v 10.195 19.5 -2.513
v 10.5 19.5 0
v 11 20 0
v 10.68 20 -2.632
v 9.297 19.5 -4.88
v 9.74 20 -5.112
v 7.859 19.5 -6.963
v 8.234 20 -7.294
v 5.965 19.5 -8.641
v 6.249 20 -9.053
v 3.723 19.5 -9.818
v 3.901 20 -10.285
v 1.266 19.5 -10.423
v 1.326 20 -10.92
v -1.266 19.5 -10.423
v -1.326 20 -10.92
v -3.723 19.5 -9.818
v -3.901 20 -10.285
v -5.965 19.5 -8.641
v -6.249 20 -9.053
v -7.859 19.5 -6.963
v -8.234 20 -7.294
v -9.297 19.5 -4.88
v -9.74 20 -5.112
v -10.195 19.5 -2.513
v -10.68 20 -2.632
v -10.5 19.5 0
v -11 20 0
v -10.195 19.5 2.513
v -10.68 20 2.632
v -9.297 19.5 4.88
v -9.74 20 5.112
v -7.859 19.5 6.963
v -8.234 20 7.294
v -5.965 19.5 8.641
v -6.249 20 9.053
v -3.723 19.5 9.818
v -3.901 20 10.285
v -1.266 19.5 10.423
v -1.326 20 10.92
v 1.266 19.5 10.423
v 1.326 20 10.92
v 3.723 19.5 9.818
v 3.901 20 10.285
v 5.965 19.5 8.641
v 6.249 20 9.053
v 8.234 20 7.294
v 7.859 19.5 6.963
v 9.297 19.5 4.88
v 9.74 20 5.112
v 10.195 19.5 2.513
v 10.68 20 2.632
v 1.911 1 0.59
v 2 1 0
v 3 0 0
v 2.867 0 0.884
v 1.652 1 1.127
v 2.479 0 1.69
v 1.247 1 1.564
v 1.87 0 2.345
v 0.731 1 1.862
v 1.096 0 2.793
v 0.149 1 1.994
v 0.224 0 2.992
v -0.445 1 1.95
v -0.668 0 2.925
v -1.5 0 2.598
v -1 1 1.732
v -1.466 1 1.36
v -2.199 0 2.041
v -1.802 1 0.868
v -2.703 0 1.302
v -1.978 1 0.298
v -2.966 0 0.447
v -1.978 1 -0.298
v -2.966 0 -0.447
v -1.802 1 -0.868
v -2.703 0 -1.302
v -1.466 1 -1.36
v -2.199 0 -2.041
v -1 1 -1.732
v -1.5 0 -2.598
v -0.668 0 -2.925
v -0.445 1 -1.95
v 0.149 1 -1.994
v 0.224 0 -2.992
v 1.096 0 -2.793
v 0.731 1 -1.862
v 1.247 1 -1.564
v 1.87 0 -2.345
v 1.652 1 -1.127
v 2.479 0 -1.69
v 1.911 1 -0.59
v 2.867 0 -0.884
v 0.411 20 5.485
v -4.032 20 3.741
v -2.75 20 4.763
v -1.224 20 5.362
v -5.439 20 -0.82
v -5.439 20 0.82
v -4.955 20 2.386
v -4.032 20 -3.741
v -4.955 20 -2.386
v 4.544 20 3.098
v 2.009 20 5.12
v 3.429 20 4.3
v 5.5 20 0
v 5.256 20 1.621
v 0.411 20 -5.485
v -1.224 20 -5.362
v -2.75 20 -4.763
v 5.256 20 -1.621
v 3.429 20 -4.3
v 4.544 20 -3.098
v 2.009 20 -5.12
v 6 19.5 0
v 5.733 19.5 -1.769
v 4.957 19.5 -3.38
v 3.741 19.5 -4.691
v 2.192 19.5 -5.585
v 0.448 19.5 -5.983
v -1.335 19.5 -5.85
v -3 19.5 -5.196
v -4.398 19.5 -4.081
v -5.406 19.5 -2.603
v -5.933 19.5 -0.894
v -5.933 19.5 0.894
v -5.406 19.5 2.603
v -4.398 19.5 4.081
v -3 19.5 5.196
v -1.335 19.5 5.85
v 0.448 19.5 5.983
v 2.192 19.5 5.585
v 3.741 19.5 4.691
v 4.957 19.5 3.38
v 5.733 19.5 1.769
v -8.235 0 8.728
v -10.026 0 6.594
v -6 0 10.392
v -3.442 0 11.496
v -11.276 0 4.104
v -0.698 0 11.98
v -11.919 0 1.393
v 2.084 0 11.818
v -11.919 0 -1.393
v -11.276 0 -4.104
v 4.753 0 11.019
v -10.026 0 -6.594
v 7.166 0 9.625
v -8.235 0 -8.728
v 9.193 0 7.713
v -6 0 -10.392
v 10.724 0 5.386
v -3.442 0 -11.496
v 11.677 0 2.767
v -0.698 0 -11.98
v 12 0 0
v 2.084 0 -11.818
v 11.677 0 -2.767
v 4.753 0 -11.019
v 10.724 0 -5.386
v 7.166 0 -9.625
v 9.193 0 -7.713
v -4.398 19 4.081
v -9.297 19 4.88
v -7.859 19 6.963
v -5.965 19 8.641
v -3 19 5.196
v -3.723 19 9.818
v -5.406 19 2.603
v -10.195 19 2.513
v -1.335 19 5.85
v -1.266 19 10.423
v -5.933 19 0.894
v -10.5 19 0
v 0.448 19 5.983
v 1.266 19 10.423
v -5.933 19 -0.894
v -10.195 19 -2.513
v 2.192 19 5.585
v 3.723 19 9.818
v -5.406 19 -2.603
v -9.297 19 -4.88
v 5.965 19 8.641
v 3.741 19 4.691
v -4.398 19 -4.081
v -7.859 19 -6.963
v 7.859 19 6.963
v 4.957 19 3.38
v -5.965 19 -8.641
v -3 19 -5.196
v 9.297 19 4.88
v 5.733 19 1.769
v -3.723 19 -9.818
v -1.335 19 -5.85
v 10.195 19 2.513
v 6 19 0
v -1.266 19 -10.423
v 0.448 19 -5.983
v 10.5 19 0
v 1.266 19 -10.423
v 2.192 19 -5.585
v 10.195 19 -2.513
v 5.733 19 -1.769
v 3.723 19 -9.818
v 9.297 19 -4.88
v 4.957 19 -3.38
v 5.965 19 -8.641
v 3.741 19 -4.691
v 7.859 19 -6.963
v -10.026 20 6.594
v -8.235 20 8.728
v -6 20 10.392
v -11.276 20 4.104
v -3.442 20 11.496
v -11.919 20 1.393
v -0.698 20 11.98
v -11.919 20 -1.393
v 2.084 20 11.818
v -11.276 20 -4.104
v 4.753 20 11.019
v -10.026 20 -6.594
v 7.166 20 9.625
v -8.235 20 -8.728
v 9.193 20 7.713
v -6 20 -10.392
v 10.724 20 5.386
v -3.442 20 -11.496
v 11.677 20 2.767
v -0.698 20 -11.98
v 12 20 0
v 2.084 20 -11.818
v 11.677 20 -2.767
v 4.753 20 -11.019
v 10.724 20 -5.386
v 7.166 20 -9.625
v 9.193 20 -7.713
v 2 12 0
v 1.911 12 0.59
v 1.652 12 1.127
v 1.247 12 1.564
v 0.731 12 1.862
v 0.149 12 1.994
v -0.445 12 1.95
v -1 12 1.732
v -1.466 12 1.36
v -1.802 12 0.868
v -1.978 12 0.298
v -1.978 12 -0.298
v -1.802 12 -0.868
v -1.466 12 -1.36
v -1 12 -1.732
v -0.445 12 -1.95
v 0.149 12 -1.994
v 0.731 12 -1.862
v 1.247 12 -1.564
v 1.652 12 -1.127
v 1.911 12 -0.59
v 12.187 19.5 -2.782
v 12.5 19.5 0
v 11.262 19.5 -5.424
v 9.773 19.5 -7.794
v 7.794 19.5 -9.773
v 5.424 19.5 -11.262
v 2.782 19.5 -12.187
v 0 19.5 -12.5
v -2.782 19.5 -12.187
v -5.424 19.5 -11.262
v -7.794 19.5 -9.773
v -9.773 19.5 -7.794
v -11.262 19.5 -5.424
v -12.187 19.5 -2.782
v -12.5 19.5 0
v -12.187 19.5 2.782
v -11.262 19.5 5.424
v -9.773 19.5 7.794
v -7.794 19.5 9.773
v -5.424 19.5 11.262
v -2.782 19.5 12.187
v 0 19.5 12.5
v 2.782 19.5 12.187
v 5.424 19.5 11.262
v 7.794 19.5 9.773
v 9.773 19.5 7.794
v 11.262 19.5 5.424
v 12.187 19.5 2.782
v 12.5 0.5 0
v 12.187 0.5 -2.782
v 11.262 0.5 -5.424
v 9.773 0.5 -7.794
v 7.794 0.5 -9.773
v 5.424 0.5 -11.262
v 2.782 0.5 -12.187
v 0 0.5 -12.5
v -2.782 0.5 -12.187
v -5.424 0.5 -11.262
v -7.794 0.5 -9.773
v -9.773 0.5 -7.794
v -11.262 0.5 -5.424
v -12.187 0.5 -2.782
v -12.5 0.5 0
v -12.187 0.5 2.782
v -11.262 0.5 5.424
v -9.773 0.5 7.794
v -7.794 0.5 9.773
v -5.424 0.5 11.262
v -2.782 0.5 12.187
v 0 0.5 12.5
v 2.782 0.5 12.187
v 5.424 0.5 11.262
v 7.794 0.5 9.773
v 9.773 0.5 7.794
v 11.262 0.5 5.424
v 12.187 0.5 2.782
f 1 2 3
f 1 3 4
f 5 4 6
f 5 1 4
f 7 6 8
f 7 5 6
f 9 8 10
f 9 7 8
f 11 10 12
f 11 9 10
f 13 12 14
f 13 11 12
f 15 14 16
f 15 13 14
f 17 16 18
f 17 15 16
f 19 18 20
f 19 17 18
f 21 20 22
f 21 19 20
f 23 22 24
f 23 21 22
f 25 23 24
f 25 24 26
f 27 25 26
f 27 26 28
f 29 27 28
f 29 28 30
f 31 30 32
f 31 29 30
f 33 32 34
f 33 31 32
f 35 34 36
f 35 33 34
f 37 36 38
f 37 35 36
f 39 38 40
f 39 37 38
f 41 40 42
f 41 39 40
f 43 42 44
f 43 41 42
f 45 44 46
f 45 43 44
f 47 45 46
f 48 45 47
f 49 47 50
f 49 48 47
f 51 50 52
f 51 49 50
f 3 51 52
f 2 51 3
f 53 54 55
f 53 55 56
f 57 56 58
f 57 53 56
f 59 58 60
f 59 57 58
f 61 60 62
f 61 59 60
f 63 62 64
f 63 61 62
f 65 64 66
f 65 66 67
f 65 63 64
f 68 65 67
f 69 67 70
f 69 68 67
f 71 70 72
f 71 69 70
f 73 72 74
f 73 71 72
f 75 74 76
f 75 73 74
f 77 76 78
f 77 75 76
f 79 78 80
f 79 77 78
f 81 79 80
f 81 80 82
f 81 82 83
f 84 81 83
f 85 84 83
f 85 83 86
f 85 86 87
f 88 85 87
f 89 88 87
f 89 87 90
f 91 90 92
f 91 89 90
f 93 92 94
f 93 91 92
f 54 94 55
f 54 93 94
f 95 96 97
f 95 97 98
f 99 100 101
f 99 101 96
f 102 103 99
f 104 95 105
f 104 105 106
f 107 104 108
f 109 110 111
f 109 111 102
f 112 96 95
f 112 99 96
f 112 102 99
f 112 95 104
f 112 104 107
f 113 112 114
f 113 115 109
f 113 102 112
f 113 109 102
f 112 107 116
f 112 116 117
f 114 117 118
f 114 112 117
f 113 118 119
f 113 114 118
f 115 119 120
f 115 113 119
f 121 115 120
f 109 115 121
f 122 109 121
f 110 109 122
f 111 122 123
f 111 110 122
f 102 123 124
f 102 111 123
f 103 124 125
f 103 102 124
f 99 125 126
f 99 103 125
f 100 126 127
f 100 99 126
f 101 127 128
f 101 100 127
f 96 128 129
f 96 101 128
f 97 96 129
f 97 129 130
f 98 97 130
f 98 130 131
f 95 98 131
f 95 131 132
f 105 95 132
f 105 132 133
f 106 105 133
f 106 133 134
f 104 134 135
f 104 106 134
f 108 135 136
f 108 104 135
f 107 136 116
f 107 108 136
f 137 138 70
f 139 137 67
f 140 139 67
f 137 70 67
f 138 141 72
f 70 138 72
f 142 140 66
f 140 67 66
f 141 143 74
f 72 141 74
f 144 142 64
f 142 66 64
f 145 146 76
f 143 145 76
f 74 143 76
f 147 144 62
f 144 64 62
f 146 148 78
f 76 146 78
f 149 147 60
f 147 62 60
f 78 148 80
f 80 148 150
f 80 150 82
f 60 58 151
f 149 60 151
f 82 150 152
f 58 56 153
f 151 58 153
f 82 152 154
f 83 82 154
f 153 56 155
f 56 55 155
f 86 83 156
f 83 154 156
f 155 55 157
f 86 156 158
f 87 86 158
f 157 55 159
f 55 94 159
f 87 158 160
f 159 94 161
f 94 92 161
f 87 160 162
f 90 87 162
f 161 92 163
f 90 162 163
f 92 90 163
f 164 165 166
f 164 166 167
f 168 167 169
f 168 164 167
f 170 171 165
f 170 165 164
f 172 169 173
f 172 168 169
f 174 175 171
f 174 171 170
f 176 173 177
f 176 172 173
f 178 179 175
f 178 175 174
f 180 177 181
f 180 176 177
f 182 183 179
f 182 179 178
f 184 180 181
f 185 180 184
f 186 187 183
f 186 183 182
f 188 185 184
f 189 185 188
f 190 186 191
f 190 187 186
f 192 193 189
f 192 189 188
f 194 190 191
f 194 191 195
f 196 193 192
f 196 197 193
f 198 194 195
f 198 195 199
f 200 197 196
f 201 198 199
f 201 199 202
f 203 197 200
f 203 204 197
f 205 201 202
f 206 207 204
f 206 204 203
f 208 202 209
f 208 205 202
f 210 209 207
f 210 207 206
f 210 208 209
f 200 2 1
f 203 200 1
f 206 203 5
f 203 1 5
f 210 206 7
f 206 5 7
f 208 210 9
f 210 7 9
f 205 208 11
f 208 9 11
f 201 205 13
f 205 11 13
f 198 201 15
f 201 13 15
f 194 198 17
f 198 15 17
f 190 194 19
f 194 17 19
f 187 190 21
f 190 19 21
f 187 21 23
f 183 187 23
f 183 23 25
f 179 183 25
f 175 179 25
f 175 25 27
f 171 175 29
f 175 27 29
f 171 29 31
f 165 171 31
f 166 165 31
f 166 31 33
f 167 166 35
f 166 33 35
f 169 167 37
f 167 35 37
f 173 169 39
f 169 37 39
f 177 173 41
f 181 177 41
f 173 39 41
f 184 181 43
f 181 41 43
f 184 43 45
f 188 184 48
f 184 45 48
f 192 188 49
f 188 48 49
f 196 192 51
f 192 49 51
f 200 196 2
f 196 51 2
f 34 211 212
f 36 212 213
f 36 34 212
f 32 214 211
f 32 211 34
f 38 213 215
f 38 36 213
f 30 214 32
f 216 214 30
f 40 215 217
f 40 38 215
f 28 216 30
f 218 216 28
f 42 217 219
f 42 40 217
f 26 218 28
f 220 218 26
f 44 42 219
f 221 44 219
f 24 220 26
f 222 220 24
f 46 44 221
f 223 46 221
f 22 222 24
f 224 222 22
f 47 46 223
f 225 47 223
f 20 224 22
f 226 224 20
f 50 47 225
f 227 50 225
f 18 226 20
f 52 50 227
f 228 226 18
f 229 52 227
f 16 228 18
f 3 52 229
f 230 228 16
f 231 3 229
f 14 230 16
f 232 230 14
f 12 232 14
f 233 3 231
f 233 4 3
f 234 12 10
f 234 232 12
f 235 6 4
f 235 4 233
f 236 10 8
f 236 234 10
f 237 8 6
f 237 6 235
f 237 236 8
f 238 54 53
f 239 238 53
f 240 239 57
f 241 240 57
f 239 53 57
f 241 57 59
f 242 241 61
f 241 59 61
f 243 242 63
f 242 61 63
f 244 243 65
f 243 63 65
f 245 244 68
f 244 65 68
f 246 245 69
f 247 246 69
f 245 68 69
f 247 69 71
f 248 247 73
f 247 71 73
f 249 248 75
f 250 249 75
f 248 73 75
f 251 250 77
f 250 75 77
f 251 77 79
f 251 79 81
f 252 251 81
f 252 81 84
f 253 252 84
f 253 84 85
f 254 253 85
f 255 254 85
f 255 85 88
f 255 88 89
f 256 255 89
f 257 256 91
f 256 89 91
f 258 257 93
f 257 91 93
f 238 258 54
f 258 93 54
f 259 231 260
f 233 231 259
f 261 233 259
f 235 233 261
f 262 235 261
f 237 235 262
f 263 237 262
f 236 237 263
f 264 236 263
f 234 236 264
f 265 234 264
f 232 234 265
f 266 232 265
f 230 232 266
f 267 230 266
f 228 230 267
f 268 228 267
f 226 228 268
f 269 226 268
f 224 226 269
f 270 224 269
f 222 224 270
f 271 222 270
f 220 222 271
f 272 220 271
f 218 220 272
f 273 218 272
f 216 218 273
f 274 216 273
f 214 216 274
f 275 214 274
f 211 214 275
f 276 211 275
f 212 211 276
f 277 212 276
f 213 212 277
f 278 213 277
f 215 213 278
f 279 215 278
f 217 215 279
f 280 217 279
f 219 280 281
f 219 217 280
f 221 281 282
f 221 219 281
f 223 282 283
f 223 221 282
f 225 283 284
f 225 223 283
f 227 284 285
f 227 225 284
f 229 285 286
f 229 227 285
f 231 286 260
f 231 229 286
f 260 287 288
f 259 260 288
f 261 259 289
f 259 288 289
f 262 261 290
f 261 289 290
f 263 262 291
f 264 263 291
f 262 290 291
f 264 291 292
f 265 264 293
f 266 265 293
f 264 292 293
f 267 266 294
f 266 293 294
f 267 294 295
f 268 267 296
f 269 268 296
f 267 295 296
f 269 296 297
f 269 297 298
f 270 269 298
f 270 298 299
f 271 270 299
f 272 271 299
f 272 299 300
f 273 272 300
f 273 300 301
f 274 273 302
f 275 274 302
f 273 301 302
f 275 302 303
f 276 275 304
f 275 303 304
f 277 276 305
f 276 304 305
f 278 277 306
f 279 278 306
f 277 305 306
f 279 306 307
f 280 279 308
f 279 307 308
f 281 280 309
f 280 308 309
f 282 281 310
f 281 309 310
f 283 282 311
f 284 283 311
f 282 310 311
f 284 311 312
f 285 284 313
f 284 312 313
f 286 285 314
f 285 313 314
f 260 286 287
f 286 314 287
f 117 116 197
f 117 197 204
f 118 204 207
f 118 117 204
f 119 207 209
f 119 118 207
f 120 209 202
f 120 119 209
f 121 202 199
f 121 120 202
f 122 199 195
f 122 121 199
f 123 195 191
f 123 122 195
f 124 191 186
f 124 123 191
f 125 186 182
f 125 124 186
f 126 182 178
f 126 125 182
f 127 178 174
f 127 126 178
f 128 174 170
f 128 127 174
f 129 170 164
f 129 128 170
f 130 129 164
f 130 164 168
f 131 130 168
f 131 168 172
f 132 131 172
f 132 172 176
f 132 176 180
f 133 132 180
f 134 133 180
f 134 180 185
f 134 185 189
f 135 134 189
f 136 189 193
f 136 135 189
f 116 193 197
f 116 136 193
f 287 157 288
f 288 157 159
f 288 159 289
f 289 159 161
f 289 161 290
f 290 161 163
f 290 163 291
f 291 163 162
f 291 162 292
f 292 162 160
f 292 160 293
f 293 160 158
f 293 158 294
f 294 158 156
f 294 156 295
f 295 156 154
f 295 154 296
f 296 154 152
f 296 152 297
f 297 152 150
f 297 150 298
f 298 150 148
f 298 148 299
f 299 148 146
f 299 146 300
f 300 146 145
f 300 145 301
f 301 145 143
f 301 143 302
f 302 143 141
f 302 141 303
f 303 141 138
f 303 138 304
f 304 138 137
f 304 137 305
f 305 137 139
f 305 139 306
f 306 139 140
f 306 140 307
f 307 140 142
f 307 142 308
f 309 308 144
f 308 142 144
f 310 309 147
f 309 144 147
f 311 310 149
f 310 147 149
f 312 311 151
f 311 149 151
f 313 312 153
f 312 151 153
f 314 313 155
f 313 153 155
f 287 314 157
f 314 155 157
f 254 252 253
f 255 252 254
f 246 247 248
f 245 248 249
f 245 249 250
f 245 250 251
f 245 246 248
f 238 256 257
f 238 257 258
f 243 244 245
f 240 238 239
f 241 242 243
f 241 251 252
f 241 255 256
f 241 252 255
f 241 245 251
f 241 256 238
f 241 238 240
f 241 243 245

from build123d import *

# Parameters (mm, degrees)
SKETCH_1_R          = 12.5
EXTRUDE_1_DEPTH     = 20
SKETCH_2_R          = 10.5
SKETCH_2_R_2        = 6
CUT_EXTRUDE_1_DEPTH = 1
CHAMFER_1_SIZE      = 0.5
SKETCH_3_R          = 2
CUT_EXTRUDE_2_DEPTH = 12
CHAMFER_2_SIZE      = 1


with BuildPart() as part:
    # Эскиз1 → Бобышка-Вытянуть1 (new body)
    with BuildSketch(Plane(origin=(0, 0, 0), x_dir=(1, 0, 0), z_dir=(0, 1, 0))):
        Circle(SKETCH_1_R)
    extrude(amount=EXTRUDE_1_DEPTH)

    # Эскиз2 → Вырез-Вытянуть1 (cut)
    with BuildSketch(Plane(origin=(0, 20, 0), x_dir=(1, 0, 0), z_dir=(0, 1, 0))):
        Circle(SKETCH_2_R)
        Circle(SKETCH_2_R_2, mode=Mode.SUBTRACT)
    extrude(amount=-CUT_EXTRUDE_1_DEPTH, mode=Mode.SUBTRACT)

    # Фаска1
    chamfer_1_edges = [part.edges().sort_by_distance(p)[0] for p in [
        (-12.5, 0, 0),
        (-12.5, 20, 0),
        (-10.5, 20, 0),
        (-6, 20, 0),
    ]]
    chamfer(chamfer_1_edges, length=CHAMFER_1_SIZE)

    # Эскиз3 → Вырез-Вытянуть2 (cut)
    with BuildSketch(Plane.XZ):
        Circle(SKETCH_3_R)
    extrude(amount=-CUT_EXTRUDE_2_DEPTH, mode=Mode.SUBTRACT)

    # Фаска2
    chamfer_2_edges = [part.edges().sort_by_distance(p)[0] for p in [
        (-2, 0, 0),
    ]]
    chamfer(chamfer_2_edges, length=CHAMFER_2_SIZE)


solid = part.part
